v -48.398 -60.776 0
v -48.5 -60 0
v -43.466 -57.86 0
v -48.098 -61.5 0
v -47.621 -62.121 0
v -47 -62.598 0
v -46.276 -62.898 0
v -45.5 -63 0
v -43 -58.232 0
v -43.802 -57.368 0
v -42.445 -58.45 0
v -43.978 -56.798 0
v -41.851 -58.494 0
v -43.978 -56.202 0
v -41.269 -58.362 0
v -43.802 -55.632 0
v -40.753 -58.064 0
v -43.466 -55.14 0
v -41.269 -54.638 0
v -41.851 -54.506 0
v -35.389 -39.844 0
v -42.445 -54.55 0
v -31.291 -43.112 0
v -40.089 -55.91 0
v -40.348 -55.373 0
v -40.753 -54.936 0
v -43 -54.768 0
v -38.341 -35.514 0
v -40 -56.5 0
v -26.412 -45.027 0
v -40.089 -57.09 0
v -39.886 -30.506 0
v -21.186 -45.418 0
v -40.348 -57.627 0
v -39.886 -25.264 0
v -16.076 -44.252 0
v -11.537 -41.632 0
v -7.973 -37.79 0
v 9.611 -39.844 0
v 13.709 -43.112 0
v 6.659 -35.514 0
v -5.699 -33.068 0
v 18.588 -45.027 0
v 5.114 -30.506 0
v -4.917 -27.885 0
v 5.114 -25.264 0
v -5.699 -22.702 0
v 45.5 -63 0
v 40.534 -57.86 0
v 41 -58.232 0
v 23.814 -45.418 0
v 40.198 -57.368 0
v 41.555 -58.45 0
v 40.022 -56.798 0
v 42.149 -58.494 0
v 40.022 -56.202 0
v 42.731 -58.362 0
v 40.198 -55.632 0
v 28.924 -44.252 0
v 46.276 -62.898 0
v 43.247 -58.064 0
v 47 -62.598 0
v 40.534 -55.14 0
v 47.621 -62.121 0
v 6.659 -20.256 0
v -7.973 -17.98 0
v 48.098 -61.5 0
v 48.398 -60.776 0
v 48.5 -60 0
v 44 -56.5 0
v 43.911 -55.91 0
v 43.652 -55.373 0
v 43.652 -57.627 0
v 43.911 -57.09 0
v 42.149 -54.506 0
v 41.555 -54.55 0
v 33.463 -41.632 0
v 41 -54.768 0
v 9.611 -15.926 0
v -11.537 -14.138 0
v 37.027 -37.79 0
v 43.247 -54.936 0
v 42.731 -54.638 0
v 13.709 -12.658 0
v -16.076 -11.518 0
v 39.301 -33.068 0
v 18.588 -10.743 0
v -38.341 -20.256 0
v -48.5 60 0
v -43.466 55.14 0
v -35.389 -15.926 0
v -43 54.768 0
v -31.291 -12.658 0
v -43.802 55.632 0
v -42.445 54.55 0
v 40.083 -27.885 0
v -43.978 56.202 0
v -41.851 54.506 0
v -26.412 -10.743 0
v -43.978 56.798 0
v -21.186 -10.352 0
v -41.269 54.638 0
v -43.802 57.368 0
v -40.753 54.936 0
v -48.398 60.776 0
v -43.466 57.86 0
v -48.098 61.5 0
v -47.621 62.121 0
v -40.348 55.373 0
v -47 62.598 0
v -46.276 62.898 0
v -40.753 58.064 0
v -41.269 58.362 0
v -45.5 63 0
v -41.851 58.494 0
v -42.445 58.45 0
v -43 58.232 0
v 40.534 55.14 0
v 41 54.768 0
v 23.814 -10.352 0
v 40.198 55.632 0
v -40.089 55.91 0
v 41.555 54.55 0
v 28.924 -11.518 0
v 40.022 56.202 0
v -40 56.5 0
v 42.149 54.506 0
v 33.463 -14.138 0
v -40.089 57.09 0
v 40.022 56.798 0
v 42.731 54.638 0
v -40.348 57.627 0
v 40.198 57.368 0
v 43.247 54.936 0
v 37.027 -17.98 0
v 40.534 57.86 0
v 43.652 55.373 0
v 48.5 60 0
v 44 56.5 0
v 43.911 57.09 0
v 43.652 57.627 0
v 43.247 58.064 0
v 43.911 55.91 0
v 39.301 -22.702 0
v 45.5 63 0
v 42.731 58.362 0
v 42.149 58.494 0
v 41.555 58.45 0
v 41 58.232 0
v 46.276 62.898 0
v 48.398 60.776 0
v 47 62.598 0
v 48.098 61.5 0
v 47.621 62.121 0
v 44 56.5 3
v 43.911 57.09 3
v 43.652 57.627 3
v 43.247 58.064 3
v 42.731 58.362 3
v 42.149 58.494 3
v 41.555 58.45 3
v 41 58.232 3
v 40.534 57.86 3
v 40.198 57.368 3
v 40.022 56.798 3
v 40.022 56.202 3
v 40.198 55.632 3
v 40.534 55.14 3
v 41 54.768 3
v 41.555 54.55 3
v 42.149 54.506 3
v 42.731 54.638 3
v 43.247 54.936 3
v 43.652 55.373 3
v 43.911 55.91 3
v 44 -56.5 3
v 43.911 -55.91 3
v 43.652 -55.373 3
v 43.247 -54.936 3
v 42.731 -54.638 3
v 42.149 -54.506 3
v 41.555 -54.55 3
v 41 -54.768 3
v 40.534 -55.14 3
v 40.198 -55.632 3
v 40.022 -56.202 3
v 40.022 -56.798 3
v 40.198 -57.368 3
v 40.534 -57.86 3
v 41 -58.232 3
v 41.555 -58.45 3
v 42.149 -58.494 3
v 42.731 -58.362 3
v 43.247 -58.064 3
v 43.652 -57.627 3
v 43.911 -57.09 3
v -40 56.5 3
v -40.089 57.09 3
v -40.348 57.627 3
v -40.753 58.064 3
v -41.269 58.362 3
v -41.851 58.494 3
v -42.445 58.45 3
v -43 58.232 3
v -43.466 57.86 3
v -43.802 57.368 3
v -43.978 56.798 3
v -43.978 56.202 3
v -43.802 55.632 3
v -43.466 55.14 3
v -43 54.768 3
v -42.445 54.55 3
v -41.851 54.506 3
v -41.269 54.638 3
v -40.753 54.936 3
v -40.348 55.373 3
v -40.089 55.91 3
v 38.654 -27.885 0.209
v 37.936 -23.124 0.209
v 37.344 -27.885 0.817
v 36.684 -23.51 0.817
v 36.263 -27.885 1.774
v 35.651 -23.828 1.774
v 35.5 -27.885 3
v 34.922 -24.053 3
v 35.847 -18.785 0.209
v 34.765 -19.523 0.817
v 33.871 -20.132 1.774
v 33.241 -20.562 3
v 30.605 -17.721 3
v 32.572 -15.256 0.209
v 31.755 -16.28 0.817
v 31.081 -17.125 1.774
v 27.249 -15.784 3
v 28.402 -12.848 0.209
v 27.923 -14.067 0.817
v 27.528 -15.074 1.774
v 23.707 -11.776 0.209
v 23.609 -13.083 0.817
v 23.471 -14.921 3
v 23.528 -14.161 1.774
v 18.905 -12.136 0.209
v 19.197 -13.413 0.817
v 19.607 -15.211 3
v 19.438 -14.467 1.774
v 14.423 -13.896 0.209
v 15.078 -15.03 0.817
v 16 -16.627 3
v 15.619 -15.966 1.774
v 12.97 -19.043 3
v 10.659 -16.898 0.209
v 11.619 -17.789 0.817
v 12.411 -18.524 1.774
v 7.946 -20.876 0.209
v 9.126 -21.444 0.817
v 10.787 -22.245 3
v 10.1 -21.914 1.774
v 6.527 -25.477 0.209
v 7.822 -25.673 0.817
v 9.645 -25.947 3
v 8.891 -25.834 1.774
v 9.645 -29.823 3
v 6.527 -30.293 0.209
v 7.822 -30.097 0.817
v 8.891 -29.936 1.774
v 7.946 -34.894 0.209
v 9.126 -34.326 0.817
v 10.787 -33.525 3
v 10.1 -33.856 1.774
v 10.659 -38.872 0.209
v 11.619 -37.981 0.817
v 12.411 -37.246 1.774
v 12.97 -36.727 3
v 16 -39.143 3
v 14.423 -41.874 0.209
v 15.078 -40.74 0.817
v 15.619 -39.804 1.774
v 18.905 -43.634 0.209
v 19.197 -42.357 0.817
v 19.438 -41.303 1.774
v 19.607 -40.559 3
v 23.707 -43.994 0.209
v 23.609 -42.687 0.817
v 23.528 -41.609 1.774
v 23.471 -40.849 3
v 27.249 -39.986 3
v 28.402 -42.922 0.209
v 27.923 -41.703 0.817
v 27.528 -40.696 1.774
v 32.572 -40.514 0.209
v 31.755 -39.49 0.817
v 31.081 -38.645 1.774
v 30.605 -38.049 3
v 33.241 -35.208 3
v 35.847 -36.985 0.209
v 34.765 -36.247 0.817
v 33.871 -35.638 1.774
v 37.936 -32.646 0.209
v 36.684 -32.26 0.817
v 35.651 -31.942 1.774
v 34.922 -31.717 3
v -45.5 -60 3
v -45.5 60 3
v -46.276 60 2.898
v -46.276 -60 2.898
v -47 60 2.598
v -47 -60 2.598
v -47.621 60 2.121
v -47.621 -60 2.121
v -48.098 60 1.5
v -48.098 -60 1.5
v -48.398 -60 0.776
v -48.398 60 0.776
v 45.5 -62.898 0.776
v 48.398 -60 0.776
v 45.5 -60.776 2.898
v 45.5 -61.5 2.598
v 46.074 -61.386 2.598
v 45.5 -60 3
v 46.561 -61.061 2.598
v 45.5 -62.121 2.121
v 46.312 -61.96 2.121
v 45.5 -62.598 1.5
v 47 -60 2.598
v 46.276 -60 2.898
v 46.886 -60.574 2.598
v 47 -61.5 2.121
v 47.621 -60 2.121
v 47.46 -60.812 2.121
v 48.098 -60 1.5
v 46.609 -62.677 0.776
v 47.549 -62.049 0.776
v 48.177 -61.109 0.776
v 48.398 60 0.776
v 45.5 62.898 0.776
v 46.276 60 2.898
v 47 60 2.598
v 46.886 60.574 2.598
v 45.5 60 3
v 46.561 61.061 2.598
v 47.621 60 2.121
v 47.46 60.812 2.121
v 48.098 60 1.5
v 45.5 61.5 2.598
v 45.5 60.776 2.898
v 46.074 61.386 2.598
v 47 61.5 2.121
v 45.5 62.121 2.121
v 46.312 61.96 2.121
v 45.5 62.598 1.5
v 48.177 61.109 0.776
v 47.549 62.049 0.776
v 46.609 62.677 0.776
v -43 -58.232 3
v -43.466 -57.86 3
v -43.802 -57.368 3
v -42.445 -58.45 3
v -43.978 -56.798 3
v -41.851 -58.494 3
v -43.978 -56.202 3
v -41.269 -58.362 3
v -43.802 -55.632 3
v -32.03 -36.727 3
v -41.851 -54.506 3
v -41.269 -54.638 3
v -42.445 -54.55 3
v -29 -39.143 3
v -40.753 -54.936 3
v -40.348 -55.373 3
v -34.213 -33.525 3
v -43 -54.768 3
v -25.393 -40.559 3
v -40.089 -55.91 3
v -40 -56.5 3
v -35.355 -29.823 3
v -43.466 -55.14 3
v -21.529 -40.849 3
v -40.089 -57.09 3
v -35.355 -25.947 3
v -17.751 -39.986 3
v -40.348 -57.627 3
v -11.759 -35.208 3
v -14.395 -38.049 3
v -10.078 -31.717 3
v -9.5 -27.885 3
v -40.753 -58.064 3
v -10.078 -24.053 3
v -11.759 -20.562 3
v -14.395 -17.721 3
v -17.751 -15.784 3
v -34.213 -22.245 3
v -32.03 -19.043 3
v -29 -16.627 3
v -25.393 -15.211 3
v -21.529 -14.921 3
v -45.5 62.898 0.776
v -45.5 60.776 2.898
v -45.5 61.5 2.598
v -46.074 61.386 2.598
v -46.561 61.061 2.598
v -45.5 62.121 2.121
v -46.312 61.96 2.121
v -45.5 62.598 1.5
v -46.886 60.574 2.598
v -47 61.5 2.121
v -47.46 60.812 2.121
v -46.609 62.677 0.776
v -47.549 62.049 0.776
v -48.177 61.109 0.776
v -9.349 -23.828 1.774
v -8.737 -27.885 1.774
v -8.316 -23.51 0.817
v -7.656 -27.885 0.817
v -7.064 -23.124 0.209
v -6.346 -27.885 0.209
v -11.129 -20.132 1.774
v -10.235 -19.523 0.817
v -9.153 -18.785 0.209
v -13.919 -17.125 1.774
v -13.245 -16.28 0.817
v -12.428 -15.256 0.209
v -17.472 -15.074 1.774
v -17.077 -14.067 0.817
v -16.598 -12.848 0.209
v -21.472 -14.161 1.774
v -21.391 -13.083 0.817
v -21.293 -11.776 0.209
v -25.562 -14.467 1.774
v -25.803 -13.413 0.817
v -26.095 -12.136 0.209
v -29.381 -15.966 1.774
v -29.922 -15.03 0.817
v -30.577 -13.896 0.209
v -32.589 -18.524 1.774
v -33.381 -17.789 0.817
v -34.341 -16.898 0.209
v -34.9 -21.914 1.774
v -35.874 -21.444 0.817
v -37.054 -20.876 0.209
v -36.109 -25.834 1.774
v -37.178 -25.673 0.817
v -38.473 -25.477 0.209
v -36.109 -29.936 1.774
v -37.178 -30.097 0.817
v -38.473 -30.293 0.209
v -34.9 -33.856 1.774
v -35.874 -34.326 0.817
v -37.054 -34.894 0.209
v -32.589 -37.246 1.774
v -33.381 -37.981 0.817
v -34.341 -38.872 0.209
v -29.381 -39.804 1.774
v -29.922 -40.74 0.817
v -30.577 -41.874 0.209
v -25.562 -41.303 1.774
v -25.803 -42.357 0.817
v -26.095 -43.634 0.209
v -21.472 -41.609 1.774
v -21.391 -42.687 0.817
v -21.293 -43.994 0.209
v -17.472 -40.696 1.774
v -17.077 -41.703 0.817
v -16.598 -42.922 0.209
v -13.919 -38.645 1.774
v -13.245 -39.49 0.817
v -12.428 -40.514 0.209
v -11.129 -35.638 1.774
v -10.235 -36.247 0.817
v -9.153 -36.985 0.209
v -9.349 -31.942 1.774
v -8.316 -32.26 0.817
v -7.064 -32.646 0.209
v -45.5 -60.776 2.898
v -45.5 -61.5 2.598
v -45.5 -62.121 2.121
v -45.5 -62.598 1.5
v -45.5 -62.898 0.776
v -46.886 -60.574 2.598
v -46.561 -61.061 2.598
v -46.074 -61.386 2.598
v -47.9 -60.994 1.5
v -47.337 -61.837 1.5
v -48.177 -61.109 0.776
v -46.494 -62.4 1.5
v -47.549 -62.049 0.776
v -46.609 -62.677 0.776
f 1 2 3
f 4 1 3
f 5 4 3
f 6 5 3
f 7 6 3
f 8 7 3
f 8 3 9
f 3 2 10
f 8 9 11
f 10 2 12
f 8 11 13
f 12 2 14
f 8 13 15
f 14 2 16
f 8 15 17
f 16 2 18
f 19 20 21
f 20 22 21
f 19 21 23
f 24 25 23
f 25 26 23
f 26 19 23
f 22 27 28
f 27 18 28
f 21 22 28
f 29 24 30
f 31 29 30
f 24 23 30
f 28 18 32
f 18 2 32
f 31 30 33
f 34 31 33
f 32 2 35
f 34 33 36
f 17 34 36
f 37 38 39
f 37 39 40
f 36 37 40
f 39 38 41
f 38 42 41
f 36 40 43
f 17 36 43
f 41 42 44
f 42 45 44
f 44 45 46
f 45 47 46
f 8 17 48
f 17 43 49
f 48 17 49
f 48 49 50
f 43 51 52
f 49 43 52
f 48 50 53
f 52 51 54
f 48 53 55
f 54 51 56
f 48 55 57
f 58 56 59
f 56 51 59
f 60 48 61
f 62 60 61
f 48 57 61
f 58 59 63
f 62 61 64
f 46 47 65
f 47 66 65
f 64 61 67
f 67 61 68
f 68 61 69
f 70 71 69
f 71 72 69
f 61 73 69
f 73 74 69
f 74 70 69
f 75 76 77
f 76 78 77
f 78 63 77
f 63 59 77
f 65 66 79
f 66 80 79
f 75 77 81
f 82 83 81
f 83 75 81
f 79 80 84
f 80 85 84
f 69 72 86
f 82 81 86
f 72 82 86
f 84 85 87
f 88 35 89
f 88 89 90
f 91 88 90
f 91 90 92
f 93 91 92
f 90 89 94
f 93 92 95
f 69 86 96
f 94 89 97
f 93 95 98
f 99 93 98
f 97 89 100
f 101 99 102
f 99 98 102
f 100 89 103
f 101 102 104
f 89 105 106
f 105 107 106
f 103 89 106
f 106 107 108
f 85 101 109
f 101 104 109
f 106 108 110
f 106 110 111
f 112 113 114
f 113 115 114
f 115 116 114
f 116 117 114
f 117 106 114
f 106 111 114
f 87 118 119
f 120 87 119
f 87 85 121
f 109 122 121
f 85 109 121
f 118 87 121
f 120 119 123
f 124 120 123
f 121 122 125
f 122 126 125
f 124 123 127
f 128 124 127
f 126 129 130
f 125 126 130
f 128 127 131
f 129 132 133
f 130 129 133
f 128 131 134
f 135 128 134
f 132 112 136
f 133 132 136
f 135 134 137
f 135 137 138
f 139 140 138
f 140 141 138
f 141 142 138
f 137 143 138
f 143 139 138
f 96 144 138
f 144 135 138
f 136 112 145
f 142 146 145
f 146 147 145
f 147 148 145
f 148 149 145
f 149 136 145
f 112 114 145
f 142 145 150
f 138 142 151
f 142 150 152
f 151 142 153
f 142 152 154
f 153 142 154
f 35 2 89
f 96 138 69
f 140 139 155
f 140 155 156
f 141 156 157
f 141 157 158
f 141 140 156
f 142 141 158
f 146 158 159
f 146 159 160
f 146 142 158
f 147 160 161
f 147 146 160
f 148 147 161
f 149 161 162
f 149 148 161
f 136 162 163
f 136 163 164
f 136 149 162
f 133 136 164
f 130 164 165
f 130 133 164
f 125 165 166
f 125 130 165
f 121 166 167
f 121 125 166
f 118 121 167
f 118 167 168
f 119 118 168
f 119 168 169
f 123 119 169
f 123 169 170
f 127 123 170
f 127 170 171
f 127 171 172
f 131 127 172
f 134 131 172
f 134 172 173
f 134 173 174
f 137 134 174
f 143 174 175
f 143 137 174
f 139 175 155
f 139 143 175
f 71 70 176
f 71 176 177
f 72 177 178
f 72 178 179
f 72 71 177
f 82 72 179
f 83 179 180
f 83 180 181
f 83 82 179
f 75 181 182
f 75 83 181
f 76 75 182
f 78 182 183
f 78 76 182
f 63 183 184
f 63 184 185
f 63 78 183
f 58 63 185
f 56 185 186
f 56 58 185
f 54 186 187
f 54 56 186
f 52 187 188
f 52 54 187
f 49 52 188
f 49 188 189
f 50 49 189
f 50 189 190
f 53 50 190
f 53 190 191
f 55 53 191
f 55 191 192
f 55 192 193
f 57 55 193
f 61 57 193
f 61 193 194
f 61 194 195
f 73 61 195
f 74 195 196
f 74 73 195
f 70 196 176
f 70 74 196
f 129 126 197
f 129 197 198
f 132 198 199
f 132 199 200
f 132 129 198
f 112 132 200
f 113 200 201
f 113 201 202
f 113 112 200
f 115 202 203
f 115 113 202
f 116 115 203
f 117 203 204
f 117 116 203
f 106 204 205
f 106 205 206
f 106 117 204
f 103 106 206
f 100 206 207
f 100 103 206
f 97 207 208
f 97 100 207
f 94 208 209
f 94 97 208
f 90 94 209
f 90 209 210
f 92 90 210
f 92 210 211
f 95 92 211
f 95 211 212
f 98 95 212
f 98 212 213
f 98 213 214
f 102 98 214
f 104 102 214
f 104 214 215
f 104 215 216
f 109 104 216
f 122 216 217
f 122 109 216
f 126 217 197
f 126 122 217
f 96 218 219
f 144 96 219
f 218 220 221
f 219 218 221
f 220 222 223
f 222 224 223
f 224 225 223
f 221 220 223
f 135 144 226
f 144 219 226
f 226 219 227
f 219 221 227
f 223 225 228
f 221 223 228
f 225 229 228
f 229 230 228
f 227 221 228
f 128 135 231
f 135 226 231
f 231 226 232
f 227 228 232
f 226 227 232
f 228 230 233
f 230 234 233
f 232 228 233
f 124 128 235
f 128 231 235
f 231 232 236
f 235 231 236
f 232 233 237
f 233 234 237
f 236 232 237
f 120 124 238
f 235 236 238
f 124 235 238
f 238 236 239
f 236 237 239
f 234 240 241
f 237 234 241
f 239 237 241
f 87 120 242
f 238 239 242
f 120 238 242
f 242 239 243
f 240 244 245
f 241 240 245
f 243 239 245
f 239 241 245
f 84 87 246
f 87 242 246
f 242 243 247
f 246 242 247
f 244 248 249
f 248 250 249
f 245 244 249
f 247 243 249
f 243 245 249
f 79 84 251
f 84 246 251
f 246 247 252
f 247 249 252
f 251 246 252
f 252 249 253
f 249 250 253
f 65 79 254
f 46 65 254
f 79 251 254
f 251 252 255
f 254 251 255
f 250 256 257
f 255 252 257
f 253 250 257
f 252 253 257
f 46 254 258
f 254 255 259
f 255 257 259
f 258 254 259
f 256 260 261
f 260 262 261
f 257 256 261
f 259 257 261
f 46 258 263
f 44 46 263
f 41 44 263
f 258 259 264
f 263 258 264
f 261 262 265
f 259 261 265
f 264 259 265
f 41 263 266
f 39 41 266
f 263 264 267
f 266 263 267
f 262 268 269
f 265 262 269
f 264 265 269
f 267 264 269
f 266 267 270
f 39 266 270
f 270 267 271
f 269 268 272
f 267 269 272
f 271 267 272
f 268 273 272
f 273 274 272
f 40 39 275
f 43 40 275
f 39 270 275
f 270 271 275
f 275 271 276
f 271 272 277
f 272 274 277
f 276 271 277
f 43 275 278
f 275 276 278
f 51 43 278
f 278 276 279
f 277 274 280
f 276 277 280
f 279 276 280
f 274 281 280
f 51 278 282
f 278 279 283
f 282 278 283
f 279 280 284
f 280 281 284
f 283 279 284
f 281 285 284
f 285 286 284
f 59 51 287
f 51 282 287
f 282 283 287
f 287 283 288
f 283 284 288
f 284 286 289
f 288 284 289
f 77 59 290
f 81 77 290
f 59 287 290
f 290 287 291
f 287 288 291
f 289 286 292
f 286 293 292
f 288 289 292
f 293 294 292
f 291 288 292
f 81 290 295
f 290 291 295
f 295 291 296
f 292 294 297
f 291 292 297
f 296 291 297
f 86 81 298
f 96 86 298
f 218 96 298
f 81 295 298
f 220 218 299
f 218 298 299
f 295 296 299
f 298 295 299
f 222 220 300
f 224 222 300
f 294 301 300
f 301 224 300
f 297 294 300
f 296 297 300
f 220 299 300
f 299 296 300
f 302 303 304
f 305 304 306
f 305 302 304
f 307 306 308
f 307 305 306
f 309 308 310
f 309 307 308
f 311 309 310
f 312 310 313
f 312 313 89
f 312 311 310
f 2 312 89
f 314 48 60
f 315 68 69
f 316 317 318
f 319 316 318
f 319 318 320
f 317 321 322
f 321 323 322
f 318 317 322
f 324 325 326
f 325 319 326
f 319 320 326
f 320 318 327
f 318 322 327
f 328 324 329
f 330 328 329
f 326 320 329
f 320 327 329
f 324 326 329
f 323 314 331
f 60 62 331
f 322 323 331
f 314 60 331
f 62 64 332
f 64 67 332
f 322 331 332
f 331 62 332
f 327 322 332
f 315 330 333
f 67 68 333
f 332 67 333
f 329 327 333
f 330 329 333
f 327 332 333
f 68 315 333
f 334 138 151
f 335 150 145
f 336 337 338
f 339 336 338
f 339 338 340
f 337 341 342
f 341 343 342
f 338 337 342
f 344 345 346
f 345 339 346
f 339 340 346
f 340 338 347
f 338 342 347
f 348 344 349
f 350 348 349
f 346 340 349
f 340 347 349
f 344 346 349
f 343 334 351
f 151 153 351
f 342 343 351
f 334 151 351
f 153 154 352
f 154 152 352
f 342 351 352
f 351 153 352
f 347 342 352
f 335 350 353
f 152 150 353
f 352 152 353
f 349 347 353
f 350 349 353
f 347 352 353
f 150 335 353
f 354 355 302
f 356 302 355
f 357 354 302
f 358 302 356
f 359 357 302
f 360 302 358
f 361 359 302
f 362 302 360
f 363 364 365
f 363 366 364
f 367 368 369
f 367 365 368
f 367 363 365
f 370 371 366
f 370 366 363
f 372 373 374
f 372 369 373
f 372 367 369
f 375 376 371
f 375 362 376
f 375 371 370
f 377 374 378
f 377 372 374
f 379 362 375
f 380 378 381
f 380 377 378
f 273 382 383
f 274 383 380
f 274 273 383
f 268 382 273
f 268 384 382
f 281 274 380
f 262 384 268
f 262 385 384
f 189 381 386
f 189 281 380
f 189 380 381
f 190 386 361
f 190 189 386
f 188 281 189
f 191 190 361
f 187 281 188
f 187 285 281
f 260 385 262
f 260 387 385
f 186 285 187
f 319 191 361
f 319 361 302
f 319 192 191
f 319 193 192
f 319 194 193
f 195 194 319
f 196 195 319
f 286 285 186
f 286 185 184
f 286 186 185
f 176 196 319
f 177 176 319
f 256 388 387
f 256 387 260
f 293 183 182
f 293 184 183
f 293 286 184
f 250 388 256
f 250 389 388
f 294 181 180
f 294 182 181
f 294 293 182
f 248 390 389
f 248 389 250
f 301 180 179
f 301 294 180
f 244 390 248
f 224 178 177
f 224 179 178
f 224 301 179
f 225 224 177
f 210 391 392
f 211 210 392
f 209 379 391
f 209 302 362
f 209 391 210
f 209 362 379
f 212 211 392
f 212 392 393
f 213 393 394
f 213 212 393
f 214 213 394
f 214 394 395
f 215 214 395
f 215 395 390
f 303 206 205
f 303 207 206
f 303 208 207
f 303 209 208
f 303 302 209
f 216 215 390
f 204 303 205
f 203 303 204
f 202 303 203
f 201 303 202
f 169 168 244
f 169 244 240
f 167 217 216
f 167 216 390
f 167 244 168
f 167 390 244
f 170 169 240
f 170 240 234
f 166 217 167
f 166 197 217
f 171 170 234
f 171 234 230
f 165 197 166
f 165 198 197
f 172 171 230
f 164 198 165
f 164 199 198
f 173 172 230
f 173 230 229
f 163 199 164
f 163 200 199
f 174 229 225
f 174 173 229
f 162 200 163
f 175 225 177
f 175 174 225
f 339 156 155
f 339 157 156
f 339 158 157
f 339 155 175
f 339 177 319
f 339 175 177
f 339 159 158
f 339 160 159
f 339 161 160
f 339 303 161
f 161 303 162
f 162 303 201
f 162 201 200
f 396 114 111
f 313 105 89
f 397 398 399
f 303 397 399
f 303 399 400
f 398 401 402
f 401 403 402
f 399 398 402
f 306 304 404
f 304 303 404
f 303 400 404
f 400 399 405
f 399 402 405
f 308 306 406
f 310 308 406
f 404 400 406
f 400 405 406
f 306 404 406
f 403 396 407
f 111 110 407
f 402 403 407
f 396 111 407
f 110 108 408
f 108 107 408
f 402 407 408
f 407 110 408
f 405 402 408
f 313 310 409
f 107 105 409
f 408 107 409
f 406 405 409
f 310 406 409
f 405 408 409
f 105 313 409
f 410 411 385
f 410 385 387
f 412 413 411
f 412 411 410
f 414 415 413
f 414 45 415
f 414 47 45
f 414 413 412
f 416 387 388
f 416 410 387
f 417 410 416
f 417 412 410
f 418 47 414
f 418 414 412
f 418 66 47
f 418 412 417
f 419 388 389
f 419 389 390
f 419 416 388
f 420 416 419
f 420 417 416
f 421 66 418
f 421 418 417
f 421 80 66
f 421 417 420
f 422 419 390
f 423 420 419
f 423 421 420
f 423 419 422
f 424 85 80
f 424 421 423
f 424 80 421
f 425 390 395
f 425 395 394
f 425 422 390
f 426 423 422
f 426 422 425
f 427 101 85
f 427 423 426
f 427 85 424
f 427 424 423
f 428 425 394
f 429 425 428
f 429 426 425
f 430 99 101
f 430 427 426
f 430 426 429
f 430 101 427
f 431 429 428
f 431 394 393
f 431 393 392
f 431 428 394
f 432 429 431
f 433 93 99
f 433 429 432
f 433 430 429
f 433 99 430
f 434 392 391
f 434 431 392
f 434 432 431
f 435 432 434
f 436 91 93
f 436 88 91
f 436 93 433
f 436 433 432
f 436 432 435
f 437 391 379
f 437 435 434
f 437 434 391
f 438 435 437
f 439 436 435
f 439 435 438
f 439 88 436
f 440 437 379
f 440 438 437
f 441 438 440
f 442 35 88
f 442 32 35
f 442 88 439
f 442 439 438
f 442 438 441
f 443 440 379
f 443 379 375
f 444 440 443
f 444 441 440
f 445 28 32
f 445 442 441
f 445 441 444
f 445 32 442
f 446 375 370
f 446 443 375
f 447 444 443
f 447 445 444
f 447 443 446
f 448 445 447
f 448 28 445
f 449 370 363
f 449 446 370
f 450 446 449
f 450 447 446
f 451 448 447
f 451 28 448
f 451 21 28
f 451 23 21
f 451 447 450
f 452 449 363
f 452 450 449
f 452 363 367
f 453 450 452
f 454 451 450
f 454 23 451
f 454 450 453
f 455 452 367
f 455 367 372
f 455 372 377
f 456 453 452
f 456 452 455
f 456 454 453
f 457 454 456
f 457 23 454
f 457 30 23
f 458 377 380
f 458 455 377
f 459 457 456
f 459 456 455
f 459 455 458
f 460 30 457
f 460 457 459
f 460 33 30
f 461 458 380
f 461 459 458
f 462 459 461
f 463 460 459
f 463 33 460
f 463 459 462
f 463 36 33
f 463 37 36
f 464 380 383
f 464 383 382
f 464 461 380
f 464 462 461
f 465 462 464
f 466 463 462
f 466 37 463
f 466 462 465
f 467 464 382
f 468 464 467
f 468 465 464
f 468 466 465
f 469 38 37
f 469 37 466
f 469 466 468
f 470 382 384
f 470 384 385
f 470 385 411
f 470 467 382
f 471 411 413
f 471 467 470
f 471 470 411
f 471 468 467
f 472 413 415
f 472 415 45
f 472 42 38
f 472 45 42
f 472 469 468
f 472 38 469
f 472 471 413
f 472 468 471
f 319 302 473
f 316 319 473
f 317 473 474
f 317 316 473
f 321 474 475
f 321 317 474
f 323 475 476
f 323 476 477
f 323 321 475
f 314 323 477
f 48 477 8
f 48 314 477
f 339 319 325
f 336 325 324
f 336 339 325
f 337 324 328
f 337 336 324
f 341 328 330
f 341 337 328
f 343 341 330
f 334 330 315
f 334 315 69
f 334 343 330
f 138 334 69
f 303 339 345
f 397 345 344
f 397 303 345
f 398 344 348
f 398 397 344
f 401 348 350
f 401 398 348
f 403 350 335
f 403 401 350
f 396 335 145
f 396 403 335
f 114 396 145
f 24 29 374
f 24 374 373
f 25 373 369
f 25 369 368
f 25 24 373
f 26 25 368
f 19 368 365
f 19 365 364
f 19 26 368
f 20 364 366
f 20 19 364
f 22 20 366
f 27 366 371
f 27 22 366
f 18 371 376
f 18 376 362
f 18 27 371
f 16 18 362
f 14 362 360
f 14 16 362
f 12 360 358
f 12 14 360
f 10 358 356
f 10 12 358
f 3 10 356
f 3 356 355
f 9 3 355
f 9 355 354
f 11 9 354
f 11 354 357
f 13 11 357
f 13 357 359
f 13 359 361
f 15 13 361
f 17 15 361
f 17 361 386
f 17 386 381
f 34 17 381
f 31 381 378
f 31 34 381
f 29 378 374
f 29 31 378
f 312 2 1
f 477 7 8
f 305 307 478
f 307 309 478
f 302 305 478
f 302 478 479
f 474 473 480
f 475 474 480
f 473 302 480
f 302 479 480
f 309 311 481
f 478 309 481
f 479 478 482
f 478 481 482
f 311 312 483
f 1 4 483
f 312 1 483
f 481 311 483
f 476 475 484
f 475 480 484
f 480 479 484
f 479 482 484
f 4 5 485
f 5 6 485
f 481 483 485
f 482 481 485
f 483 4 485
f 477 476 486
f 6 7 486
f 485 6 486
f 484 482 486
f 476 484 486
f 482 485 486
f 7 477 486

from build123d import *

# Parameters (mm, degrees)
F0_W     = 97
F0_H     = 126
F0_R     = 2
F0_R_2   = 13
F1_DEPTH = 3
F4_R     = 3
F5_R     = 3
F6_R     = 2.99999


# Not quite as in the source:
# - a fillet or chamfer that OpenCascade refuses, or shapes differently, is made with other operations: its cross-section is extruded or revolved along the edge and cut away or added
# - a fillet or chamfer is up to 0.001 mm smaller than in the source, because OpenCascade refuses the exact size


with BuildPart() as f1:
    # F0 (on Top) → F1 (new body)
    with BuildSketch(Plane.XY):
        Rectangle(F0_W, F0_H)
        with Locations((-42, -56.5)):
            Circle(F0_R, mode=Mode.SUBTRACT)
        with Locations((-22.5, -27.884999302)):
            Circle(F0_R_2, mode=Mode.SUBTRACT)
        with Locations((42, -56.5)):
            Circle(F0_R, mode=Mode.SUBTRACT)
        with Locations((22.5, -27.8849992901)):
            Circle(F0_R_2, mode=Mode.SUBTRACT)
        with Locations((-42, 56.5)):
            Circle(F0_R, mode=Mode.SUBTRACT)
        with Locations((42, 56.5)):
            Circle(F0_R, mode=Mode.SUBTRACT)
    extrude(amount=F1_DEPTH)

    # F2: fillet of radius 5 on 1 edges, made by hand

    # F2_s1 → F2_t2 (revolve, cut)
    with BuildSketch(Plane.XZ.offset(27.884999302)):
        with BuildLine():
            ThreePointArc((-9.5, 3), (-7.6560370926, 0.8166998673), (-4.917424305, 0))
            Line((-4.917424305, 0), (-9.5, 0))
            Line((-9.5, 0), (-9.5, 3))
        make_face()
    revolve(axis=Axis((-22.5, -27.884999302, 0), (0, 0, 1)), mode=Mode.SUBTRACT)

    # F3: fillet of radius 5 on 1 edges, made by hand

    # F3_s1 → F3_t2 (revolve, cut)
    with BuildSketch(Plane.XZ.offset(27.8849992901)):
        with BuildLine():
            ThreePointArc((40.082575695, 0), (37.3439629074, 0.8166998673), (35.5, 3))
            Line((35.5, 3), (35.5, 0))
            Line((35.5, 0), (40.082575695, 0))
        make_face()
    revolve(axis=Axis((22.5, -27.8849992901, 0), (0, 0, 1)), mode=Mode.SUBTRACT)

    # F4
    f4_edges = [f1.edges().sort_by_distance(p)[0] for p in [
        (48.5, -63, 1.5),
        (-48.5, -63, 1.5),
    ]]
    fillet(f4_edges, radius=F4_R)

    # F5
    f5_edges = [f1.edges().sort_by_distance(p)[0] for p in [
        (48.5, 63, 1.5),
        (-48.5, 63, 1.5),
    ]]
    fillet(f5_edges, radius=F5_R)

    # F6 (radius 3 in the source; OpenCascade refuses exactly that, so slightly less here)
    f6_edges = [f1.edges().sort_by_distance(p)[0] for p in [
        (0, -63, 3),
        (47.62132, -62.12132, 3),
        (48.5, 0, 3),
        (47.62132, 62.12132, 3),
        (0, 63, 3),
        (-47.62132, 62.12132, 3),
        (-48.5, 0, 3),
        (-47.62132, -62.12132, 3),
    ]]
    fillet(f6_edges, radius=F6_R)


solid = f1.part
